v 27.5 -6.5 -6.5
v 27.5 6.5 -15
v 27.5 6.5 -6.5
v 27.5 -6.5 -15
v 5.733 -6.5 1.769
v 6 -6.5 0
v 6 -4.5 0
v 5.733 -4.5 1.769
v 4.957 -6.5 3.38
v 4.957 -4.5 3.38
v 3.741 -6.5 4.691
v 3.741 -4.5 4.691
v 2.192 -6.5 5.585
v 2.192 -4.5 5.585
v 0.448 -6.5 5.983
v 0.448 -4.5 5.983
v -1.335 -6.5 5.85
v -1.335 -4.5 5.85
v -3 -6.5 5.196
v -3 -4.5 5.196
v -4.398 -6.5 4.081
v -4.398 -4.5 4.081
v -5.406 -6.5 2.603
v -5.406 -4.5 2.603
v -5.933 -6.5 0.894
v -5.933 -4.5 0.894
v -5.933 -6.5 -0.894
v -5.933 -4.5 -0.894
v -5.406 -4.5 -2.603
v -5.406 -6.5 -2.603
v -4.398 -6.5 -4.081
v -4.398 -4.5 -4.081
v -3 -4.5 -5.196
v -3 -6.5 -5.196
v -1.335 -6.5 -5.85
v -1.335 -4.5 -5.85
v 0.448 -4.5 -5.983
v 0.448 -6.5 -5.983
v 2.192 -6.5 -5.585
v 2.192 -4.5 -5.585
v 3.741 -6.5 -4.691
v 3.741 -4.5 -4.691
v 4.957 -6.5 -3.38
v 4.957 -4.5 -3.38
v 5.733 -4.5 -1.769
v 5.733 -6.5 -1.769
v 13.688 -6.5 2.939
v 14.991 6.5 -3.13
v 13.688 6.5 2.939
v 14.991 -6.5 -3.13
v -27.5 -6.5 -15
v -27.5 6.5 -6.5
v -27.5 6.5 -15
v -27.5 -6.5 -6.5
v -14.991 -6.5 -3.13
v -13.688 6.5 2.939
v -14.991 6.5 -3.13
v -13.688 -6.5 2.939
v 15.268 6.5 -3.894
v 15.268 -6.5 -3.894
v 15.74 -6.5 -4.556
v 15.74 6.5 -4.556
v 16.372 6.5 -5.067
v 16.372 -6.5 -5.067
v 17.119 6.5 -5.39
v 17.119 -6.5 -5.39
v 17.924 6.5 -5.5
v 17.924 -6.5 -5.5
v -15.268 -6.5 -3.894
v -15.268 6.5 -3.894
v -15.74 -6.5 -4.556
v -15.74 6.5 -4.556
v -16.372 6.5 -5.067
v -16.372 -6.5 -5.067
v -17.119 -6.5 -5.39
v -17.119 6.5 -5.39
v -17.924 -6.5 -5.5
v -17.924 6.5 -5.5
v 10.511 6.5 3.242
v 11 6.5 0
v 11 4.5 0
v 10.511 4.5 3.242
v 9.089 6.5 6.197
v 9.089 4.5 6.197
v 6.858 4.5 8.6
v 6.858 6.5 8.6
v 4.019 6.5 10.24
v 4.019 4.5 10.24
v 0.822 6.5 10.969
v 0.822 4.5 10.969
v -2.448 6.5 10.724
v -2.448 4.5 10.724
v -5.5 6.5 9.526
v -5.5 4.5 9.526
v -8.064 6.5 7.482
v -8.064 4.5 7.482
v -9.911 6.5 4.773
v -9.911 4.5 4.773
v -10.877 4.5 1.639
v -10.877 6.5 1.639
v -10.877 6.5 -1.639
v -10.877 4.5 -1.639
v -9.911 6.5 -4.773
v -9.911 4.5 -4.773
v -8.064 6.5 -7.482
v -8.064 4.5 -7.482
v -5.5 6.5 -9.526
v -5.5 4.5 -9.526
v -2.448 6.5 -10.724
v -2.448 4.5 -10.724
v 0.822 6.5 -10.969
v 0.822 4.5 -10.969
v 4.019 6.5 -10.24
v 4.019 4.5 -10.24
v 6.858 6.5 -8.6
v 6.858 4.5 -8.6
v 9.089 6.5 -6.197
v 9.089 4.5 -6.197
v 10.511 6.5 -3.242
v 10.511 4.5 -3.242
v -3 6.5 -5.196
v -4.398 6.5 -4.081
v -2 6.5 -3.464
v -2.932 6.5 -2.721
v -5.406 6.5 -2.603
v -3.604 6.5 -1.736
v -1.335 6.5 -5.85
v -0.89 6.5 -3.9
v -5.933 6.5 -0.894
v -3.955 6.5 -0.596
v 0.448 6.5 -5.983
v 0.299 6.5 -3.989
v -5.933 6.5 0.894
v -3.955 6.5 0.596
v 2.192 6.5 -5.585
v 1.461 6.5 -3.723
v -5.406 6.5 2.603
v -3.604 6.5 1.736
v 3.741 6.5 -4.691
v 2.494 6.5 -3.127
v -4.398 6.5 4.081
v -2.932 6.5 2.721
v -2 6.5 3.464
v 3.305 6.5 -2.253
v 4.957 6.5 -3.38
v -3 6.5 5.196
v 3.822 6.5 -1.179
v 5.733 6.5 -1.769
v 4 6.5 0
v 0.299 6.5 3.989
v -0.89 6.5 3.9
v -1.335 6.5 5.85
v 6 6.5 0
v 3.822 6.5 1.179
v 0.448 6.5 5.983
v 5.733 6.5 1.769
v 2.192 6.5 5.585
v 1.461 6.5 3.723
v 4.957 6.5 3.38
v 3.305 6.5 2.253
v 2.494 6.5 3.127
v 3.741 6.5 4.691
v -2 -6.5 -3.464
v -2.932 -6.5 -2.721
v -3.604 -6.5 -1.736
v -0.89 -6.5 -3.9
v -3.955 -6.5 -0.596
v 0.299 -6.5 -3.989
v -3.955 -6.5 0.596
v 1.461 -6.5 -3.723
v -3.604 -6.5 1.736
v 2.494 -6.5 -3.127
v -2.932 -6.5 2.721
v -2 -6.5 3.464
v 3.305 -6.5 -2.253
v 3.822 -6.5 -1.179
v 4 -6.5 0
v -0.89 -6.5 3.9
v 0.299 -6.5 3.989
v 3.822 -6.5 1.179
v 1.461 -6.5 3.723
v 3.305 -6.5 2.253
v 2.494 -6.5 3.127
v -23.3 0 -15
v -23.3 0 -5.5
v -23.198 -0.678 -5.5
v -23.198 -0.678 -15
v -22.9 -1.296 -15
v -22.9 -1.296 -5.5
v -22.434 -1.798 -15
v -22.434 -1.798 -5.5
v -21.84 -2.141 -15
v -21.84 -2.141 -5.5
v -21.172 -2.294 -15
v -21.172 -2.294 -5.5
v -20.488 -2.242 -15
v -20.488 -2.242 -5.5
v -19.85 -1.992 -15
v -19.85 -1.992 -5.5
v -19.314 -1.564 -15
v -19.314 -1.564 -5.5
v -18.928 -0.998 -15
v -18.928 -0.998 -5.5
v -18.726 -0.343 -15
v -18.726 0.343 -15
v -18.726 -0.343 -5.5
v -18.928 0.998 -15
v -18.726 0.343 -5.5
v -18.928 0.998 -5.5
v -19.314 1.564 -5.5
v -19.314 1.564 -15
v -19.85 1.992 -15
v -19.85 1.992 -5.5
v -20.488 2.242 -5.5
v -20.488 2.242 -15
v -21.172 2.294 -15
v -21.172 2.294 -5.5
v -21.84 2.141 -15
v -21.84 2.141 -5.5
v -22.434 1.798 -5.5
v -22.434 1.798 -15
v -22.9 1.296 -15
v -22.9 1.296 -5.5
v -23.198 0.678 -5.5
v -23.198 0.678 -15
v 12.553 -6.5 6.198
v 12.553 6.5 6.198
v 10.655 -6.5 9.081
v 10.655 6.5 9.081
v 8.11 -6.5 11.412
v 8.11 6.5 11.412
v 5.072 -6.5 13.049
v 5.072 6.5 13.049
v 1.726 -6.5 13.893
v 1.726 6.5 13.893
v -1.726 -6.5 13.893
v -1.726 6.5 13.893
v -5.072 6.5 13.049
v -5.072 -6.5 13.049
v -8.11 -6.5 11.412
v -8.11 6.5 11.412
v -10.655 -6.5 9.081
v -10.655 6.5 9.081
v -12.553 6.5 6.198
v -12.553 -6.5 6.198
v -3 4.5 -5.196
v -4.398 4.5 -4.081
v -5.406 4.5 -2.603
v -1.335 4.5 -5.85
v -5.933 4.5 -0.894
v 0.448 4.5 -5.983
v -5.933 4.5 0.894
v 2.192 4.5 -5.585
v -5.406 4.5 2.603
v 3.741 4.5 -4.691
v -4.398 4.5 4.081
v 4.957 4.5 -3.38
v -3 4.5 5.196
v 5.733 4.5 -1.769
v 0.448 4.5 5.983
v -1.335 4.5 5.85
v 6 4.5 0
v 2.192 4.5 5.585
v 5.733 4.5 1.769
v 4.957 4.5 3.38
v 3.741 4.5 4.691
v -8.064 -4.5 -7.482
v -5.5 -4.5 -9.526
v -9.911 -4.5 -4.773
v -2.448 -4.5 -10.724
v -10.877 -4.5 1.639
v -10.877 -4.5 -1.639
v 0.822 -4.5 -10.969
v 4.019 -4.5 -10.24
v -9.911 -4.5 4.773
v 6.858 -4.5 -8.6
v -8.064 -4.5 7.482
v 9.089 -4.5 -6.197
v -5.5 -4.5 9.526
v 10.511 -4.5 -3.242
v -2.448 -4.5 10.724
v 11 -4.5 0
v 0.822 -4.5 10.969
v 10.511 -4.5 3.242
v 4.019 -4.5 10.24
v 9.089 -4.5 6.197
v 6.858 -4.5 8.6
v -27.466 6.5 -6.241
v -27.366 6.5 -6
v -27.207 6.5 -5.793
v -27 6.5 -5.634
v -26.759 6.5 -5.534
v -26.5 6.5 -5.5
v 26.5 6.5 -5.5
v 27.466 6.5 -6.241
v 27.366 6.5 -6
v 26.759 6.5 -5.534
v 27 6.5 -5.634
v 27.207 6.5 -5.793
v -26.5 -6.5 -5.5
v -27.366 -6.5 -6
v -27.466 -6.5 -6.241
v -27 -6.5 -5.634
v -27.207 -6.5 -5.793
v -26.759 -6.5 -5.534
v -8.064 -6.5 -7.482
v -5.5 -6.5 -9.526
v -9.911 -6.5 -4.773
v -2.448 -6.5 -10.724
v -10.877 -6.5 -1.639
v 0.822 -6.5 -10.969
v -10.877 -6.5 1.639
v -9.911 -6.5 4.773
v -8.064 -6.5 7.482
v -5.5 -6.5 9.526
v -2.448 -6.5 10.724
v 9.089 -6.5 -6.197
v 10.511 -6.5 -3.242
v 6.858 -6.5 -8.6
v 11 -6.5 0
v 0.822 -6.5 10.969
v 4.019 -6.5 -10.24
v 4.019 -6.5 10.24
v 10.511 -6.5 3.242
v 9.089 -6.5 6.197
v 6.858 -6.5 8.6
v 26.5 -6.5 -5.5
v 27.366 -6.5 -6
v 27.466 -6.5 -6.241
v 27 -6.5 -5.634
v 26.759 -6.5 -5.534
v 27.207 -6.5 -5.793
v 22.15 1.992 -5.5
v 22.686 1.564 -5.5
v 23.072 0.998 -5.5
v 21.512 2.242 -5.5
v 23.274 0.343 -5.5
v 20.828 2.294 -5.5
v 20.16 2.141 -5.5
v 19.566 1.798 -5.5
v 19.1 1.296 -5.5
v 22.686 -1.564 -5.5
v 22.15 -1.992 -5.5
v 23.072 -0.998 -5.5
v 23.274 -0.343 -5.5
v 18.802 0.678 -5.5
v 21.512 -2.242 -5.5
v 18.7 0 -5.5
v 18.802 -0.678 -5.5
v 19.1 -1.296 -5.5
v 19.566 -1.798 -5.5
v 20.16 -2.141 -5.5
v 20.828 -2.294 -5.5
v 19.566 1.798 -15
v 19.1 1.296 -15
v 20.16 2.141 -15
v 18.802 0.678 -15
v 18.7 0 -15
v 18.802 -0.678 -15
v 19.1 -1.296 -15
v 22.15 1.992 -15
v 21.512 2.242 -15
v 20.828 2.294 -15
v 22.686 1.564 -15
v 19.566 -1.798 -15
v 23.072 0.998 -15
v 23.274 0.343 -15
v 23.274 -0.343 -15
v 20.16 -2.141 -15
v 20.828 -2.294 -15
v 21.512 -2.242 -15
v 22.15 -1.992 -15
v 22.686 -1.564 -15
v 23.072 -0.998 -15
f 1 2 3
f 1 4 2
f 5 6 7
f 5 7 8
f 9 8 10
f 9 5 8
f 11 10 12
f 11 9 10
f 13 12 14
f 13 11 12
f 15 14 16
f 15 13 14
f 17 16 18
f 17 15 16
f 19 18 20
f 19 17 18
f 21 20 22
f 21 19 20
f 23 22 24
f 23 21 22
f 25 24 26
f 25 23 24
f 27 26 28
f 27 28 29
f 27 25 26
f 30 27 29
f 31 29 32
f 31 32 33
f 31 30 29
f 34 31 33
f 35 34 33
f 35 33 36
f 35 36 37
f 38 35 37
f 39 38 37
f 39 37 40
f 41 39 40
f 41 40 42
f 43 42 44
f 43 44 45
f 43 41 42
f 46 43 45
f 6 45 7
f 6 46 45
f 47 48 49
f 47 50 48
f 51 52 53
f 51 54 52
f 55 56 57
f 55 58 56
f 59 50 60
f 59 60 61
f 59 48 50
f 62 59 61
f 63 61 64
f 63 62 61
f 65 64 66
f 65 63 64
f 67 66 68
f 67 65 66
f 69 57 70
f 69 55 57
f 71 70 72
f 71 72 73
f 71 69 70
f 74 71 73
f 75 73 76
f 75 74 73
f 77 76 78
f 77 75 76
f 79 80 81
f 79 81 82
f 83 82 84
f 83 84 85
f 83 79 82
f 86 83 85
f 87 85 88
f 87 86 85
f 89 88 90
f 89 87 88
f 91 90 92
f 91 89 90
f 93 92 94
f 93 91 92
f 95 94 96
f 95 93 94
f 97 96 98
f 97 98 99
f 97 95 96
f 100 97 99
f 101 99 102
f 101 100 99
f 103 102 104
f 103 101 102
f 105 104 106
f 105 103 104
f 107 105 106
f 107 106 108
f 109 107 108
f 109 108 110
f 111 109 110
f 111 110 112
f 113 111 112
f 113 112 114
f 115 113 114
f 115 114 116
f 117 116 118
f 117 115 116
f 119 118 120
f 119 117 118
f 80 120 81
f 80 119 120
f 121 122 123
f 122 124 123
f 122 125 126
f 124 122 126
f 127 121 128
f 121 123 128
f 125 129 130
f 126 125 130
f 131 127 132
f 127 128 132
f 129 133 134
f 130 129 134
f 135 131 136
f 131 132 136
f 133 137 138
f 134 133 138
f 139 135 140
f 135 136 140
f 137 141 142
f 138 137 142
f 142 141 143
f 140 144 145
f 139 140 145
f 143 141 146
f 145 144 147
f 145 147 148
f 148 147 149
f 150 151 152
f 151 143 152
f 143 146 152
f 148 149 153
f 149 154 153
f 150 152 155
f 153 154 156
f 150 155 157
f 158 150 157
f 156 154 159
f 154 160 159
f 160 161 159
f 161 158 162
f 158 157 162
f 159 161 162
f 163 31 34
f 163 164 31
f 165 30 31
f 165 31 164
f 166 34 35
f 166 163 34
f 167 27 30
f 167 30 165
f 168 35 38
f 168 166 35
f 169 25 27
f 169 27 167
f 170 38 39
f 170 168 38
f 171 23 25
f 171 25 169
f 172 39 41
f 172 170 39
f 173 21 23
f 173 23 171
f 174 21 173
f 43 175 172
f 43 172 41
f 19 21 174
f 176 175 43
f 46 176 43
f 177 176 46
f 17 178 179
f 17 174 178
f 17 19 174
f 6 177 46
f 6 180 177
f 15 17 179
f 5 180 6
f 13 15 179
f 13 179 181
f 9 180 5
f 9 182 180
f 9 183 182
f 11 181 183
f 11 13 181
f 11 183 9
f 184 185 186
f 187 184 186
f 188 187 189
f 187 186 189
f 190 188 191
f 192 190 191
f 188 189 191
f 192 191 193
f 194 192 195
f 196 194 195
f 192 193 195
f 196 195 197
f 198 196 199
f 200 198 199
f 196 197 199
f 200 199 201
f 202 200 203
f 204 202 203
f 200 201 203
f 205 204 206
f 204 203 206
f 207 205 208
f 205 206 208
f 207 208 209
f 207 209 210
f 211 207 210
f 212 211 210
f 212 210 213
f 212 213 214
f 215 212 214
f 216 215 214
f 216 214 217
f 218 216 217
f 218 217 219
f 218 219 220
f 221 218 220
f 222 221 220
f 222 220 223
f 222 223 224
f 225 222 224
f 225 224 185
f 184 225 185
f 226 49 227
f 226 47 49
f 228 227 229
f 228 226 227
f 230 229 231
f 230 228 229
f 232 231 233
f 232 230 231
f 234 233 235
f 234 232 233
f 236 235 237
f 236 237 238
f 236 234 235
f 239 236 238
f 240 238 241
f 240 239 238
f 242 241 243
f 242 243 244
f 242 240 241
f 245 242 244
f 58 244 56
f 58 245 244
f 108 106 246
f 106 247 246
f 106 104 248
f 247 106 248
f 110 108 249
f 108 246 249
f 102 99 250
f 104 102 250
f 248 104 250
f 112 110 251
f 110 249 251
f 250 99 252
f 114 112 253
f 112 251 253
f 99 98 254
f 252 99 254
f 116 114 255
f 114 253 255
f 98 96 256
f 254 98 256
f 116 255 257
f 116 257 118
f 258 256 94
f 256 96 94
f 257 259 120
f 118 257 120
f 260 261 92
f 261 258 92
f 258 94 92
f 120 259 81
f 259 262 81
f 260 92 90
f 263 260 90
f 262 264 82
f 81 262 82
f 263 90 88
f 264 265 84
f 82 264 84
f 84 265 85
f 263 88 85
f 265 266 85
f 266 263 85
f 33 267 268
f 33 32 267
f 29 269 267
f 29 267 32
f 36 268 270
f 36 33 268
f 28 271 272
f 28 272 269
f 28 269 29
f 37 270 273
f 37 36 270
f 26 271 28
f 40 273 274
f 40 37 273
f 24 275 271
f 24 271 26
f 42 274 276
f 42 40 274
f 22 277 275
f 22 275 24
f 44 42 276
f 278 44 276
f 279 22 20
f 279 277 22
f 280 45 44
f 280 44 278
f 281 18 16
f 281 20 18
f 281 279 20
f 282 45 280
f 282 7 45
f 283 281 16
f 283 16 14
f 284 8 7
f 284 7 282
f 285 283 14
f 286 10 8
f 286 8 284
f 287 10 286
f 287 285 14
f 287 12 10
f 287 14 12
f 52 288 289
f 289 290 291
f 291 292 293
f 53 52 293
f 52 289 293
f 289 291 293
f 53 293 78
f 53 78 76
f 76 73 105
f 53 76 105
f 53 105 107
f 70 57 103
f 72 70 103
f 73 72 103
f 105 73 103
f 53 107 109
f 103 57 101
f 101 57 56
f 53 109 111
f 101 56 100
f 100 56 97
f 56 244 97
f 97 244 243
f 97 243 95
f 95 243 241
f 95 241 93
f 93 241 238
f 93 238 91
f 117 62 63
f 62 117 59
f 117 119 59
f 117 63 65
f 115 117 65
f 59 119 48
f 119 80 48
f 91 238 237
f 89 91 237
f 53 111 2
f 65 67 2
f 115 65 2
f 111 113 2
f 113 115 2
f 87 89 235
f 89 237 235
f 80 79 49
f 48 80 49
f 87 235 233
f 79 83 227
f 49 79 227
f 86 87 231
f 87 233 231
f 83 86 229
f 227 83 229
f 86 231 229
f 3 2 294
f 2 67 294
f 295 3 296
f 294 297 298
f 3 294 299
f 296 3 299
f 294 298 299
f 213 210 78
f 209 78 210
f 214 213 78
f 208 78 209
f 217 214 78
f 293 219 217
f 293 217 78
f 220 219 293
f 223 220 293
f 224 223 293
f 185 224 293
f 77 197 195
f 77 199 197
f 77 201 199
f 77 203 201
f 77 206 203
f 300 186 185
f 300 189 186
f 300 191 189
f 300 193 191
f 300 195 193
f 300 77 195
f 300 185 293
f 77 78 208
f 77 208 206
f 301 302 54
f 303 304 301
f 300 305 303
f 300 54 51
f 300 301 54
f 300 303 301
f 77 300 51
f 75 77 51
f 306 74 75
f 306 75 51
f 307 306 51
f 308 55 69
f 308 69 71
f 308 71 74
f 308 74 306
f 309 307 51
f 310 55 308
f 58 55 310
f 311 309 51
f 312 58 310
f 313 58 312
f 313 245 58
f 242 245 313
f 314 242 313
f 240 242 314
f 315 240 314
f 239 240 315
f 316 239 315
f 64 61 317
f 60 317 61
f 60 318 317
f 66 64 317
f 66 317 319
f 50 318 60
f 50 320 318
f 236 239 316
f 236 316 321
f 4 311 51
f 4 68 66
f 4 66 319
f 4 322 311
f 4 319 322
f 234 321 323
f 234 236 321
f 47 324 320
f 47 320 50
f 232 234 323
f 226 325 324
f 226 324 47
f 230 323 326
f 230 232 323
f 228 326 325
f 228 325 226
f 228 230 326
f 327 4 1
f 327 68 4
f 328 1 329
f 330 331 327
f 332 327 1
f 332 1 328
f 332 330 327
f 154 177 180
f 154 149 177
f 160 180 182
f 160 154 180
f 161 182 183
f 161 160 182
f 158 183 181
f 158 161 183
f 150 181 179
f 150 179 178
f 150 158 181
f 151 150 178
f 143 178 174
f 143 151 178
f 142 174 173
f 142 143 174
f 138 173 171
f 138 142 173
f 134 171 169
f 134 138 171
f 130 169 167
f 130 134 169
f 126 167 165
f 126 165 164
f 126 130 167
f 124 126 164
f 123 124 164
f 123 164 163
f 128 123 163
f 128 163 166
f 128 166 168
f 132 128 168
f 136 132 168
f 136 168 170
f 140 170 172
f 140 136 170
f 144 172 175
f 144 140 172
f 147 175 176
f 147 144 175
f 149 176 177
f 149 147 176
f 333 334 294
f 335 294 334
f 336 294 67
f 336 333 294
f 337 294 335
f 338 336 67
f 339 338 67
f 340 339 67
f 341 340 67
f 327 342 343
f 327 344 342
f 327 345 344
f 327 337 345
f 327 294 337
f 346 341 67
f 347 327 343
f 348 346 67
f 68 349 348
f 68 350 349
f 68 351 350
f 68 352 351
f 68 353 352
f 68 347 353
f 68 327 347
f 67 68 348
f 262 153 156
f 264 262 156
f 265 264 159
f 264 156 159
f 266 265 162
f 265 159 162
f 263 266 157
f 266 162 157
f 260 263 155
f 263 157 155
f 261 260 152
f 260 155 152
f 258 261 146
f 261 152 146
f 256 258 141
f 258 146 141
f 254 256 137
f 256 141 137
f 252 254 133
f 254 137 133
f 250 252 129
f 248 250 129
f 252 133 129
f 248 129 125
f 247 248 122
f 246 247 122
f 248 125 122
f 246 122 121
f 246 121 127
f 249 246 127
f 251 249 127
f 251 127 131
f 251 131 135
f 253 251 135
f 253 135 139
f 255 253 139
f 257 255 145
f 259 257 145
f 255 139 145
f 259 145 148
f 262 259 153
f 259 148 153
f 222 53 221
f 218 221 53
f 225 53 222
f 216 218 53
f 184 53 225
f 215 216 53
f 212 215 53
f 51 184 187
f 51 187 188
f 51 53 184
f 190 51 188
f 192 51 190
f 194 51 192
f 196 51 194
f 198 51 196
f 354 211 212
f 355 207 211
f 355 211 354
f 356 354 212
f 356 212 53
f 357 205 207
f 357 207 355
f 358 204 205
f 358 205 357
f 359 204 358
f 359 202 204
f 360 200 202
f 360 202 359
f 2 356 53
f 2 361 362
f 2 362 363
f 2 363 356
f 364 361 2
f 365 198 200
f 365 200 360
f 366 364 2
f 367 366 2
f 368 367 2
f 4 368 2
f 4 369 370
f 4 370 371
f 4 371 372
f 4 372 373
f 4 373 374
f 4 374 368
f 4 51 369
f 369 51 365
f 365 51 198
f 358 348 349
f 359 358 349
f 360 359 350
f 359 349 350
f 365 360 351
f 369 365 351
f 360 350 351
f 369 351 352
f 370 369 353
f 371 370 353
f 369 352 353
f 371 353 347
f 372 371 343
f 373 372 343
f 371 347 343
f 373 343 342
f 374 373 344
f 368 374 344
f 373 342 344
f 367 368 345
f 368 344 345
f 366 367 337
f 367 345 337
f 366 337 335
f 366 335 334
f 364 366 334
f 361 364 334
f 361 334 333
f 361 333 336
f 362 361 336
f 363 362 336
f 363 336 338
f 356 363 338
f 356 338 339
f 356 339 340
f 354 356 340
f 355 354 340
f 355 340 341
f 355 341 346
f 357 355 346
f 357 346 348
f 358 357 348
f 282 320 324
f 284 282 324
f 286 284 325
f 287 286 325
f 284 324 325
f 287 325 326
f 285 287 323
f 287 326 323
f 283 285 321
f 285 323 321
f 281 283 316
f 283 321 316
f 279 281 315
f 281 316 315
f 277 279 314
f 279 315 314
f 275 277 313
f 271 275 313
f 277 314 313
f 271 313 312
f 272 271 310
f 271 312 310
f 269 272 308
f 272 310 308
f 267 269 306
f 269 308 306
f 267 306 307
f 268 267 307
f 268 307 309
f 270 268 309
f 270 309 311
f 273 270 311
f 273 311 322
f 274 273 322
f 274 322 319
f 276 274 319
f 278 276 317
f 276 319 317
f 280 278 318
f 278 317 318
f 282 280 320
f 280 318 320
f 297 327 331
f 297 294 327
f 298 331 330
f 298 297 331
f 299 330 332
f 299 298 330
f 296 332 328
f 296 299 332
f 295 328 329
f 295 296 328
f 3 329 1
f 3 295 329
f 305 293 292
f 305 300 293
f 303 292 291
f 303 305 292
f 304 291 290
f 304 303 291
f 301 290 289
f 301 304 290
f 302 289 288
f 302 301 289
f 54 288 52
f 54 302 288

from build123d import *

# Parameters (mm, degrees)
SKETCH_R      = 4
PAD_DEPTH     = 6.5
SKETCH001_R   = 11
SKETCH001_R_2 = 6
POCKET_DEPTH  = 2
FILLET_R      = 3
FILLET001_R   = 1
SKETCH002_R   = 2.3
HOLE_DEPTH    = 25


with BuildPart() as part:
    # Sketch → Pad (new body, symmetric)
    with BuildSketch(Plane.XZ):
        with BuildLine():
            ThreePointArc((13.688033, 2.939003), (0, 14), (-13.688033, 2.939003))
            Line((-13.688033, 2.939003), (-15.5, -5.5))
            Line((-15.5, -5.5), (-27.5, -5.5))
            Line((-27.5, -5.5), (-27.5, -15))
            Line((-27.5, -15), (27.5, -15))
            Line((27.5, -15), (27.5, -5.5))
            Line((27.5, -5.5), (15.5, -5.5))
            Line((15.5, -5.5), (13.688033, 2.939003))
        make_face()
        Circle(SKETCH_R, mode=Mode.SUBTRACT)
    extrude(amount=PAD_DEPTH, both=True)

    # Sketch001 (on Face11 of Pad) → Pocket (cut)
    with BuildSketch(Plane.XZ.offset(6.5)):
        Circle(SKETCH001_R)
        Circle(SKETCH001_R_2, mode=Mode.SUBTRACT)
    pocket = extrude(amount=-POCKET_DEPTH, mode=Mode.SUBTRACT)

    # Mirrored: Pocket across XZ
    add(pocket.mirror(Plane.XZ), mode=Mode.SUBTRACT)

    # Fillet
    fillet_edges = [part.edges().sort_by_distance(p)[0] for p in [
        (15.5, 0, -5.5),
        (-15.5, 0, -5.5),
    ]]
    fillet(fillet_edges, radius=FILLET_R)

    # Fillet001
    fillet001_edges = [part.edges().sort_by_distance(p)[0] for p in [
        (-27.5, 0, -5.5),
        (27.5, 0, -5.5),
    ]]
    fillet(fillet001_edges, radius=FILLET001_R)

    # Sketch002 (on Face13 of Fillet001) → Hole (cut)
    with BuildSketch(Plane(origin=(0, 0, -5.5), x_dir=(-1, 0, 0), z_dir=(0, 0, 1))):
        with Locations((-21, 0)):
            Circle(SKETCH002_R)
        with Locations((21, 0)):
            Circle(SKETCH002_R)
    extrude(amount=-HOLE_DEPTH, mode=Mode.SUBTRACT)


solid = part.part
